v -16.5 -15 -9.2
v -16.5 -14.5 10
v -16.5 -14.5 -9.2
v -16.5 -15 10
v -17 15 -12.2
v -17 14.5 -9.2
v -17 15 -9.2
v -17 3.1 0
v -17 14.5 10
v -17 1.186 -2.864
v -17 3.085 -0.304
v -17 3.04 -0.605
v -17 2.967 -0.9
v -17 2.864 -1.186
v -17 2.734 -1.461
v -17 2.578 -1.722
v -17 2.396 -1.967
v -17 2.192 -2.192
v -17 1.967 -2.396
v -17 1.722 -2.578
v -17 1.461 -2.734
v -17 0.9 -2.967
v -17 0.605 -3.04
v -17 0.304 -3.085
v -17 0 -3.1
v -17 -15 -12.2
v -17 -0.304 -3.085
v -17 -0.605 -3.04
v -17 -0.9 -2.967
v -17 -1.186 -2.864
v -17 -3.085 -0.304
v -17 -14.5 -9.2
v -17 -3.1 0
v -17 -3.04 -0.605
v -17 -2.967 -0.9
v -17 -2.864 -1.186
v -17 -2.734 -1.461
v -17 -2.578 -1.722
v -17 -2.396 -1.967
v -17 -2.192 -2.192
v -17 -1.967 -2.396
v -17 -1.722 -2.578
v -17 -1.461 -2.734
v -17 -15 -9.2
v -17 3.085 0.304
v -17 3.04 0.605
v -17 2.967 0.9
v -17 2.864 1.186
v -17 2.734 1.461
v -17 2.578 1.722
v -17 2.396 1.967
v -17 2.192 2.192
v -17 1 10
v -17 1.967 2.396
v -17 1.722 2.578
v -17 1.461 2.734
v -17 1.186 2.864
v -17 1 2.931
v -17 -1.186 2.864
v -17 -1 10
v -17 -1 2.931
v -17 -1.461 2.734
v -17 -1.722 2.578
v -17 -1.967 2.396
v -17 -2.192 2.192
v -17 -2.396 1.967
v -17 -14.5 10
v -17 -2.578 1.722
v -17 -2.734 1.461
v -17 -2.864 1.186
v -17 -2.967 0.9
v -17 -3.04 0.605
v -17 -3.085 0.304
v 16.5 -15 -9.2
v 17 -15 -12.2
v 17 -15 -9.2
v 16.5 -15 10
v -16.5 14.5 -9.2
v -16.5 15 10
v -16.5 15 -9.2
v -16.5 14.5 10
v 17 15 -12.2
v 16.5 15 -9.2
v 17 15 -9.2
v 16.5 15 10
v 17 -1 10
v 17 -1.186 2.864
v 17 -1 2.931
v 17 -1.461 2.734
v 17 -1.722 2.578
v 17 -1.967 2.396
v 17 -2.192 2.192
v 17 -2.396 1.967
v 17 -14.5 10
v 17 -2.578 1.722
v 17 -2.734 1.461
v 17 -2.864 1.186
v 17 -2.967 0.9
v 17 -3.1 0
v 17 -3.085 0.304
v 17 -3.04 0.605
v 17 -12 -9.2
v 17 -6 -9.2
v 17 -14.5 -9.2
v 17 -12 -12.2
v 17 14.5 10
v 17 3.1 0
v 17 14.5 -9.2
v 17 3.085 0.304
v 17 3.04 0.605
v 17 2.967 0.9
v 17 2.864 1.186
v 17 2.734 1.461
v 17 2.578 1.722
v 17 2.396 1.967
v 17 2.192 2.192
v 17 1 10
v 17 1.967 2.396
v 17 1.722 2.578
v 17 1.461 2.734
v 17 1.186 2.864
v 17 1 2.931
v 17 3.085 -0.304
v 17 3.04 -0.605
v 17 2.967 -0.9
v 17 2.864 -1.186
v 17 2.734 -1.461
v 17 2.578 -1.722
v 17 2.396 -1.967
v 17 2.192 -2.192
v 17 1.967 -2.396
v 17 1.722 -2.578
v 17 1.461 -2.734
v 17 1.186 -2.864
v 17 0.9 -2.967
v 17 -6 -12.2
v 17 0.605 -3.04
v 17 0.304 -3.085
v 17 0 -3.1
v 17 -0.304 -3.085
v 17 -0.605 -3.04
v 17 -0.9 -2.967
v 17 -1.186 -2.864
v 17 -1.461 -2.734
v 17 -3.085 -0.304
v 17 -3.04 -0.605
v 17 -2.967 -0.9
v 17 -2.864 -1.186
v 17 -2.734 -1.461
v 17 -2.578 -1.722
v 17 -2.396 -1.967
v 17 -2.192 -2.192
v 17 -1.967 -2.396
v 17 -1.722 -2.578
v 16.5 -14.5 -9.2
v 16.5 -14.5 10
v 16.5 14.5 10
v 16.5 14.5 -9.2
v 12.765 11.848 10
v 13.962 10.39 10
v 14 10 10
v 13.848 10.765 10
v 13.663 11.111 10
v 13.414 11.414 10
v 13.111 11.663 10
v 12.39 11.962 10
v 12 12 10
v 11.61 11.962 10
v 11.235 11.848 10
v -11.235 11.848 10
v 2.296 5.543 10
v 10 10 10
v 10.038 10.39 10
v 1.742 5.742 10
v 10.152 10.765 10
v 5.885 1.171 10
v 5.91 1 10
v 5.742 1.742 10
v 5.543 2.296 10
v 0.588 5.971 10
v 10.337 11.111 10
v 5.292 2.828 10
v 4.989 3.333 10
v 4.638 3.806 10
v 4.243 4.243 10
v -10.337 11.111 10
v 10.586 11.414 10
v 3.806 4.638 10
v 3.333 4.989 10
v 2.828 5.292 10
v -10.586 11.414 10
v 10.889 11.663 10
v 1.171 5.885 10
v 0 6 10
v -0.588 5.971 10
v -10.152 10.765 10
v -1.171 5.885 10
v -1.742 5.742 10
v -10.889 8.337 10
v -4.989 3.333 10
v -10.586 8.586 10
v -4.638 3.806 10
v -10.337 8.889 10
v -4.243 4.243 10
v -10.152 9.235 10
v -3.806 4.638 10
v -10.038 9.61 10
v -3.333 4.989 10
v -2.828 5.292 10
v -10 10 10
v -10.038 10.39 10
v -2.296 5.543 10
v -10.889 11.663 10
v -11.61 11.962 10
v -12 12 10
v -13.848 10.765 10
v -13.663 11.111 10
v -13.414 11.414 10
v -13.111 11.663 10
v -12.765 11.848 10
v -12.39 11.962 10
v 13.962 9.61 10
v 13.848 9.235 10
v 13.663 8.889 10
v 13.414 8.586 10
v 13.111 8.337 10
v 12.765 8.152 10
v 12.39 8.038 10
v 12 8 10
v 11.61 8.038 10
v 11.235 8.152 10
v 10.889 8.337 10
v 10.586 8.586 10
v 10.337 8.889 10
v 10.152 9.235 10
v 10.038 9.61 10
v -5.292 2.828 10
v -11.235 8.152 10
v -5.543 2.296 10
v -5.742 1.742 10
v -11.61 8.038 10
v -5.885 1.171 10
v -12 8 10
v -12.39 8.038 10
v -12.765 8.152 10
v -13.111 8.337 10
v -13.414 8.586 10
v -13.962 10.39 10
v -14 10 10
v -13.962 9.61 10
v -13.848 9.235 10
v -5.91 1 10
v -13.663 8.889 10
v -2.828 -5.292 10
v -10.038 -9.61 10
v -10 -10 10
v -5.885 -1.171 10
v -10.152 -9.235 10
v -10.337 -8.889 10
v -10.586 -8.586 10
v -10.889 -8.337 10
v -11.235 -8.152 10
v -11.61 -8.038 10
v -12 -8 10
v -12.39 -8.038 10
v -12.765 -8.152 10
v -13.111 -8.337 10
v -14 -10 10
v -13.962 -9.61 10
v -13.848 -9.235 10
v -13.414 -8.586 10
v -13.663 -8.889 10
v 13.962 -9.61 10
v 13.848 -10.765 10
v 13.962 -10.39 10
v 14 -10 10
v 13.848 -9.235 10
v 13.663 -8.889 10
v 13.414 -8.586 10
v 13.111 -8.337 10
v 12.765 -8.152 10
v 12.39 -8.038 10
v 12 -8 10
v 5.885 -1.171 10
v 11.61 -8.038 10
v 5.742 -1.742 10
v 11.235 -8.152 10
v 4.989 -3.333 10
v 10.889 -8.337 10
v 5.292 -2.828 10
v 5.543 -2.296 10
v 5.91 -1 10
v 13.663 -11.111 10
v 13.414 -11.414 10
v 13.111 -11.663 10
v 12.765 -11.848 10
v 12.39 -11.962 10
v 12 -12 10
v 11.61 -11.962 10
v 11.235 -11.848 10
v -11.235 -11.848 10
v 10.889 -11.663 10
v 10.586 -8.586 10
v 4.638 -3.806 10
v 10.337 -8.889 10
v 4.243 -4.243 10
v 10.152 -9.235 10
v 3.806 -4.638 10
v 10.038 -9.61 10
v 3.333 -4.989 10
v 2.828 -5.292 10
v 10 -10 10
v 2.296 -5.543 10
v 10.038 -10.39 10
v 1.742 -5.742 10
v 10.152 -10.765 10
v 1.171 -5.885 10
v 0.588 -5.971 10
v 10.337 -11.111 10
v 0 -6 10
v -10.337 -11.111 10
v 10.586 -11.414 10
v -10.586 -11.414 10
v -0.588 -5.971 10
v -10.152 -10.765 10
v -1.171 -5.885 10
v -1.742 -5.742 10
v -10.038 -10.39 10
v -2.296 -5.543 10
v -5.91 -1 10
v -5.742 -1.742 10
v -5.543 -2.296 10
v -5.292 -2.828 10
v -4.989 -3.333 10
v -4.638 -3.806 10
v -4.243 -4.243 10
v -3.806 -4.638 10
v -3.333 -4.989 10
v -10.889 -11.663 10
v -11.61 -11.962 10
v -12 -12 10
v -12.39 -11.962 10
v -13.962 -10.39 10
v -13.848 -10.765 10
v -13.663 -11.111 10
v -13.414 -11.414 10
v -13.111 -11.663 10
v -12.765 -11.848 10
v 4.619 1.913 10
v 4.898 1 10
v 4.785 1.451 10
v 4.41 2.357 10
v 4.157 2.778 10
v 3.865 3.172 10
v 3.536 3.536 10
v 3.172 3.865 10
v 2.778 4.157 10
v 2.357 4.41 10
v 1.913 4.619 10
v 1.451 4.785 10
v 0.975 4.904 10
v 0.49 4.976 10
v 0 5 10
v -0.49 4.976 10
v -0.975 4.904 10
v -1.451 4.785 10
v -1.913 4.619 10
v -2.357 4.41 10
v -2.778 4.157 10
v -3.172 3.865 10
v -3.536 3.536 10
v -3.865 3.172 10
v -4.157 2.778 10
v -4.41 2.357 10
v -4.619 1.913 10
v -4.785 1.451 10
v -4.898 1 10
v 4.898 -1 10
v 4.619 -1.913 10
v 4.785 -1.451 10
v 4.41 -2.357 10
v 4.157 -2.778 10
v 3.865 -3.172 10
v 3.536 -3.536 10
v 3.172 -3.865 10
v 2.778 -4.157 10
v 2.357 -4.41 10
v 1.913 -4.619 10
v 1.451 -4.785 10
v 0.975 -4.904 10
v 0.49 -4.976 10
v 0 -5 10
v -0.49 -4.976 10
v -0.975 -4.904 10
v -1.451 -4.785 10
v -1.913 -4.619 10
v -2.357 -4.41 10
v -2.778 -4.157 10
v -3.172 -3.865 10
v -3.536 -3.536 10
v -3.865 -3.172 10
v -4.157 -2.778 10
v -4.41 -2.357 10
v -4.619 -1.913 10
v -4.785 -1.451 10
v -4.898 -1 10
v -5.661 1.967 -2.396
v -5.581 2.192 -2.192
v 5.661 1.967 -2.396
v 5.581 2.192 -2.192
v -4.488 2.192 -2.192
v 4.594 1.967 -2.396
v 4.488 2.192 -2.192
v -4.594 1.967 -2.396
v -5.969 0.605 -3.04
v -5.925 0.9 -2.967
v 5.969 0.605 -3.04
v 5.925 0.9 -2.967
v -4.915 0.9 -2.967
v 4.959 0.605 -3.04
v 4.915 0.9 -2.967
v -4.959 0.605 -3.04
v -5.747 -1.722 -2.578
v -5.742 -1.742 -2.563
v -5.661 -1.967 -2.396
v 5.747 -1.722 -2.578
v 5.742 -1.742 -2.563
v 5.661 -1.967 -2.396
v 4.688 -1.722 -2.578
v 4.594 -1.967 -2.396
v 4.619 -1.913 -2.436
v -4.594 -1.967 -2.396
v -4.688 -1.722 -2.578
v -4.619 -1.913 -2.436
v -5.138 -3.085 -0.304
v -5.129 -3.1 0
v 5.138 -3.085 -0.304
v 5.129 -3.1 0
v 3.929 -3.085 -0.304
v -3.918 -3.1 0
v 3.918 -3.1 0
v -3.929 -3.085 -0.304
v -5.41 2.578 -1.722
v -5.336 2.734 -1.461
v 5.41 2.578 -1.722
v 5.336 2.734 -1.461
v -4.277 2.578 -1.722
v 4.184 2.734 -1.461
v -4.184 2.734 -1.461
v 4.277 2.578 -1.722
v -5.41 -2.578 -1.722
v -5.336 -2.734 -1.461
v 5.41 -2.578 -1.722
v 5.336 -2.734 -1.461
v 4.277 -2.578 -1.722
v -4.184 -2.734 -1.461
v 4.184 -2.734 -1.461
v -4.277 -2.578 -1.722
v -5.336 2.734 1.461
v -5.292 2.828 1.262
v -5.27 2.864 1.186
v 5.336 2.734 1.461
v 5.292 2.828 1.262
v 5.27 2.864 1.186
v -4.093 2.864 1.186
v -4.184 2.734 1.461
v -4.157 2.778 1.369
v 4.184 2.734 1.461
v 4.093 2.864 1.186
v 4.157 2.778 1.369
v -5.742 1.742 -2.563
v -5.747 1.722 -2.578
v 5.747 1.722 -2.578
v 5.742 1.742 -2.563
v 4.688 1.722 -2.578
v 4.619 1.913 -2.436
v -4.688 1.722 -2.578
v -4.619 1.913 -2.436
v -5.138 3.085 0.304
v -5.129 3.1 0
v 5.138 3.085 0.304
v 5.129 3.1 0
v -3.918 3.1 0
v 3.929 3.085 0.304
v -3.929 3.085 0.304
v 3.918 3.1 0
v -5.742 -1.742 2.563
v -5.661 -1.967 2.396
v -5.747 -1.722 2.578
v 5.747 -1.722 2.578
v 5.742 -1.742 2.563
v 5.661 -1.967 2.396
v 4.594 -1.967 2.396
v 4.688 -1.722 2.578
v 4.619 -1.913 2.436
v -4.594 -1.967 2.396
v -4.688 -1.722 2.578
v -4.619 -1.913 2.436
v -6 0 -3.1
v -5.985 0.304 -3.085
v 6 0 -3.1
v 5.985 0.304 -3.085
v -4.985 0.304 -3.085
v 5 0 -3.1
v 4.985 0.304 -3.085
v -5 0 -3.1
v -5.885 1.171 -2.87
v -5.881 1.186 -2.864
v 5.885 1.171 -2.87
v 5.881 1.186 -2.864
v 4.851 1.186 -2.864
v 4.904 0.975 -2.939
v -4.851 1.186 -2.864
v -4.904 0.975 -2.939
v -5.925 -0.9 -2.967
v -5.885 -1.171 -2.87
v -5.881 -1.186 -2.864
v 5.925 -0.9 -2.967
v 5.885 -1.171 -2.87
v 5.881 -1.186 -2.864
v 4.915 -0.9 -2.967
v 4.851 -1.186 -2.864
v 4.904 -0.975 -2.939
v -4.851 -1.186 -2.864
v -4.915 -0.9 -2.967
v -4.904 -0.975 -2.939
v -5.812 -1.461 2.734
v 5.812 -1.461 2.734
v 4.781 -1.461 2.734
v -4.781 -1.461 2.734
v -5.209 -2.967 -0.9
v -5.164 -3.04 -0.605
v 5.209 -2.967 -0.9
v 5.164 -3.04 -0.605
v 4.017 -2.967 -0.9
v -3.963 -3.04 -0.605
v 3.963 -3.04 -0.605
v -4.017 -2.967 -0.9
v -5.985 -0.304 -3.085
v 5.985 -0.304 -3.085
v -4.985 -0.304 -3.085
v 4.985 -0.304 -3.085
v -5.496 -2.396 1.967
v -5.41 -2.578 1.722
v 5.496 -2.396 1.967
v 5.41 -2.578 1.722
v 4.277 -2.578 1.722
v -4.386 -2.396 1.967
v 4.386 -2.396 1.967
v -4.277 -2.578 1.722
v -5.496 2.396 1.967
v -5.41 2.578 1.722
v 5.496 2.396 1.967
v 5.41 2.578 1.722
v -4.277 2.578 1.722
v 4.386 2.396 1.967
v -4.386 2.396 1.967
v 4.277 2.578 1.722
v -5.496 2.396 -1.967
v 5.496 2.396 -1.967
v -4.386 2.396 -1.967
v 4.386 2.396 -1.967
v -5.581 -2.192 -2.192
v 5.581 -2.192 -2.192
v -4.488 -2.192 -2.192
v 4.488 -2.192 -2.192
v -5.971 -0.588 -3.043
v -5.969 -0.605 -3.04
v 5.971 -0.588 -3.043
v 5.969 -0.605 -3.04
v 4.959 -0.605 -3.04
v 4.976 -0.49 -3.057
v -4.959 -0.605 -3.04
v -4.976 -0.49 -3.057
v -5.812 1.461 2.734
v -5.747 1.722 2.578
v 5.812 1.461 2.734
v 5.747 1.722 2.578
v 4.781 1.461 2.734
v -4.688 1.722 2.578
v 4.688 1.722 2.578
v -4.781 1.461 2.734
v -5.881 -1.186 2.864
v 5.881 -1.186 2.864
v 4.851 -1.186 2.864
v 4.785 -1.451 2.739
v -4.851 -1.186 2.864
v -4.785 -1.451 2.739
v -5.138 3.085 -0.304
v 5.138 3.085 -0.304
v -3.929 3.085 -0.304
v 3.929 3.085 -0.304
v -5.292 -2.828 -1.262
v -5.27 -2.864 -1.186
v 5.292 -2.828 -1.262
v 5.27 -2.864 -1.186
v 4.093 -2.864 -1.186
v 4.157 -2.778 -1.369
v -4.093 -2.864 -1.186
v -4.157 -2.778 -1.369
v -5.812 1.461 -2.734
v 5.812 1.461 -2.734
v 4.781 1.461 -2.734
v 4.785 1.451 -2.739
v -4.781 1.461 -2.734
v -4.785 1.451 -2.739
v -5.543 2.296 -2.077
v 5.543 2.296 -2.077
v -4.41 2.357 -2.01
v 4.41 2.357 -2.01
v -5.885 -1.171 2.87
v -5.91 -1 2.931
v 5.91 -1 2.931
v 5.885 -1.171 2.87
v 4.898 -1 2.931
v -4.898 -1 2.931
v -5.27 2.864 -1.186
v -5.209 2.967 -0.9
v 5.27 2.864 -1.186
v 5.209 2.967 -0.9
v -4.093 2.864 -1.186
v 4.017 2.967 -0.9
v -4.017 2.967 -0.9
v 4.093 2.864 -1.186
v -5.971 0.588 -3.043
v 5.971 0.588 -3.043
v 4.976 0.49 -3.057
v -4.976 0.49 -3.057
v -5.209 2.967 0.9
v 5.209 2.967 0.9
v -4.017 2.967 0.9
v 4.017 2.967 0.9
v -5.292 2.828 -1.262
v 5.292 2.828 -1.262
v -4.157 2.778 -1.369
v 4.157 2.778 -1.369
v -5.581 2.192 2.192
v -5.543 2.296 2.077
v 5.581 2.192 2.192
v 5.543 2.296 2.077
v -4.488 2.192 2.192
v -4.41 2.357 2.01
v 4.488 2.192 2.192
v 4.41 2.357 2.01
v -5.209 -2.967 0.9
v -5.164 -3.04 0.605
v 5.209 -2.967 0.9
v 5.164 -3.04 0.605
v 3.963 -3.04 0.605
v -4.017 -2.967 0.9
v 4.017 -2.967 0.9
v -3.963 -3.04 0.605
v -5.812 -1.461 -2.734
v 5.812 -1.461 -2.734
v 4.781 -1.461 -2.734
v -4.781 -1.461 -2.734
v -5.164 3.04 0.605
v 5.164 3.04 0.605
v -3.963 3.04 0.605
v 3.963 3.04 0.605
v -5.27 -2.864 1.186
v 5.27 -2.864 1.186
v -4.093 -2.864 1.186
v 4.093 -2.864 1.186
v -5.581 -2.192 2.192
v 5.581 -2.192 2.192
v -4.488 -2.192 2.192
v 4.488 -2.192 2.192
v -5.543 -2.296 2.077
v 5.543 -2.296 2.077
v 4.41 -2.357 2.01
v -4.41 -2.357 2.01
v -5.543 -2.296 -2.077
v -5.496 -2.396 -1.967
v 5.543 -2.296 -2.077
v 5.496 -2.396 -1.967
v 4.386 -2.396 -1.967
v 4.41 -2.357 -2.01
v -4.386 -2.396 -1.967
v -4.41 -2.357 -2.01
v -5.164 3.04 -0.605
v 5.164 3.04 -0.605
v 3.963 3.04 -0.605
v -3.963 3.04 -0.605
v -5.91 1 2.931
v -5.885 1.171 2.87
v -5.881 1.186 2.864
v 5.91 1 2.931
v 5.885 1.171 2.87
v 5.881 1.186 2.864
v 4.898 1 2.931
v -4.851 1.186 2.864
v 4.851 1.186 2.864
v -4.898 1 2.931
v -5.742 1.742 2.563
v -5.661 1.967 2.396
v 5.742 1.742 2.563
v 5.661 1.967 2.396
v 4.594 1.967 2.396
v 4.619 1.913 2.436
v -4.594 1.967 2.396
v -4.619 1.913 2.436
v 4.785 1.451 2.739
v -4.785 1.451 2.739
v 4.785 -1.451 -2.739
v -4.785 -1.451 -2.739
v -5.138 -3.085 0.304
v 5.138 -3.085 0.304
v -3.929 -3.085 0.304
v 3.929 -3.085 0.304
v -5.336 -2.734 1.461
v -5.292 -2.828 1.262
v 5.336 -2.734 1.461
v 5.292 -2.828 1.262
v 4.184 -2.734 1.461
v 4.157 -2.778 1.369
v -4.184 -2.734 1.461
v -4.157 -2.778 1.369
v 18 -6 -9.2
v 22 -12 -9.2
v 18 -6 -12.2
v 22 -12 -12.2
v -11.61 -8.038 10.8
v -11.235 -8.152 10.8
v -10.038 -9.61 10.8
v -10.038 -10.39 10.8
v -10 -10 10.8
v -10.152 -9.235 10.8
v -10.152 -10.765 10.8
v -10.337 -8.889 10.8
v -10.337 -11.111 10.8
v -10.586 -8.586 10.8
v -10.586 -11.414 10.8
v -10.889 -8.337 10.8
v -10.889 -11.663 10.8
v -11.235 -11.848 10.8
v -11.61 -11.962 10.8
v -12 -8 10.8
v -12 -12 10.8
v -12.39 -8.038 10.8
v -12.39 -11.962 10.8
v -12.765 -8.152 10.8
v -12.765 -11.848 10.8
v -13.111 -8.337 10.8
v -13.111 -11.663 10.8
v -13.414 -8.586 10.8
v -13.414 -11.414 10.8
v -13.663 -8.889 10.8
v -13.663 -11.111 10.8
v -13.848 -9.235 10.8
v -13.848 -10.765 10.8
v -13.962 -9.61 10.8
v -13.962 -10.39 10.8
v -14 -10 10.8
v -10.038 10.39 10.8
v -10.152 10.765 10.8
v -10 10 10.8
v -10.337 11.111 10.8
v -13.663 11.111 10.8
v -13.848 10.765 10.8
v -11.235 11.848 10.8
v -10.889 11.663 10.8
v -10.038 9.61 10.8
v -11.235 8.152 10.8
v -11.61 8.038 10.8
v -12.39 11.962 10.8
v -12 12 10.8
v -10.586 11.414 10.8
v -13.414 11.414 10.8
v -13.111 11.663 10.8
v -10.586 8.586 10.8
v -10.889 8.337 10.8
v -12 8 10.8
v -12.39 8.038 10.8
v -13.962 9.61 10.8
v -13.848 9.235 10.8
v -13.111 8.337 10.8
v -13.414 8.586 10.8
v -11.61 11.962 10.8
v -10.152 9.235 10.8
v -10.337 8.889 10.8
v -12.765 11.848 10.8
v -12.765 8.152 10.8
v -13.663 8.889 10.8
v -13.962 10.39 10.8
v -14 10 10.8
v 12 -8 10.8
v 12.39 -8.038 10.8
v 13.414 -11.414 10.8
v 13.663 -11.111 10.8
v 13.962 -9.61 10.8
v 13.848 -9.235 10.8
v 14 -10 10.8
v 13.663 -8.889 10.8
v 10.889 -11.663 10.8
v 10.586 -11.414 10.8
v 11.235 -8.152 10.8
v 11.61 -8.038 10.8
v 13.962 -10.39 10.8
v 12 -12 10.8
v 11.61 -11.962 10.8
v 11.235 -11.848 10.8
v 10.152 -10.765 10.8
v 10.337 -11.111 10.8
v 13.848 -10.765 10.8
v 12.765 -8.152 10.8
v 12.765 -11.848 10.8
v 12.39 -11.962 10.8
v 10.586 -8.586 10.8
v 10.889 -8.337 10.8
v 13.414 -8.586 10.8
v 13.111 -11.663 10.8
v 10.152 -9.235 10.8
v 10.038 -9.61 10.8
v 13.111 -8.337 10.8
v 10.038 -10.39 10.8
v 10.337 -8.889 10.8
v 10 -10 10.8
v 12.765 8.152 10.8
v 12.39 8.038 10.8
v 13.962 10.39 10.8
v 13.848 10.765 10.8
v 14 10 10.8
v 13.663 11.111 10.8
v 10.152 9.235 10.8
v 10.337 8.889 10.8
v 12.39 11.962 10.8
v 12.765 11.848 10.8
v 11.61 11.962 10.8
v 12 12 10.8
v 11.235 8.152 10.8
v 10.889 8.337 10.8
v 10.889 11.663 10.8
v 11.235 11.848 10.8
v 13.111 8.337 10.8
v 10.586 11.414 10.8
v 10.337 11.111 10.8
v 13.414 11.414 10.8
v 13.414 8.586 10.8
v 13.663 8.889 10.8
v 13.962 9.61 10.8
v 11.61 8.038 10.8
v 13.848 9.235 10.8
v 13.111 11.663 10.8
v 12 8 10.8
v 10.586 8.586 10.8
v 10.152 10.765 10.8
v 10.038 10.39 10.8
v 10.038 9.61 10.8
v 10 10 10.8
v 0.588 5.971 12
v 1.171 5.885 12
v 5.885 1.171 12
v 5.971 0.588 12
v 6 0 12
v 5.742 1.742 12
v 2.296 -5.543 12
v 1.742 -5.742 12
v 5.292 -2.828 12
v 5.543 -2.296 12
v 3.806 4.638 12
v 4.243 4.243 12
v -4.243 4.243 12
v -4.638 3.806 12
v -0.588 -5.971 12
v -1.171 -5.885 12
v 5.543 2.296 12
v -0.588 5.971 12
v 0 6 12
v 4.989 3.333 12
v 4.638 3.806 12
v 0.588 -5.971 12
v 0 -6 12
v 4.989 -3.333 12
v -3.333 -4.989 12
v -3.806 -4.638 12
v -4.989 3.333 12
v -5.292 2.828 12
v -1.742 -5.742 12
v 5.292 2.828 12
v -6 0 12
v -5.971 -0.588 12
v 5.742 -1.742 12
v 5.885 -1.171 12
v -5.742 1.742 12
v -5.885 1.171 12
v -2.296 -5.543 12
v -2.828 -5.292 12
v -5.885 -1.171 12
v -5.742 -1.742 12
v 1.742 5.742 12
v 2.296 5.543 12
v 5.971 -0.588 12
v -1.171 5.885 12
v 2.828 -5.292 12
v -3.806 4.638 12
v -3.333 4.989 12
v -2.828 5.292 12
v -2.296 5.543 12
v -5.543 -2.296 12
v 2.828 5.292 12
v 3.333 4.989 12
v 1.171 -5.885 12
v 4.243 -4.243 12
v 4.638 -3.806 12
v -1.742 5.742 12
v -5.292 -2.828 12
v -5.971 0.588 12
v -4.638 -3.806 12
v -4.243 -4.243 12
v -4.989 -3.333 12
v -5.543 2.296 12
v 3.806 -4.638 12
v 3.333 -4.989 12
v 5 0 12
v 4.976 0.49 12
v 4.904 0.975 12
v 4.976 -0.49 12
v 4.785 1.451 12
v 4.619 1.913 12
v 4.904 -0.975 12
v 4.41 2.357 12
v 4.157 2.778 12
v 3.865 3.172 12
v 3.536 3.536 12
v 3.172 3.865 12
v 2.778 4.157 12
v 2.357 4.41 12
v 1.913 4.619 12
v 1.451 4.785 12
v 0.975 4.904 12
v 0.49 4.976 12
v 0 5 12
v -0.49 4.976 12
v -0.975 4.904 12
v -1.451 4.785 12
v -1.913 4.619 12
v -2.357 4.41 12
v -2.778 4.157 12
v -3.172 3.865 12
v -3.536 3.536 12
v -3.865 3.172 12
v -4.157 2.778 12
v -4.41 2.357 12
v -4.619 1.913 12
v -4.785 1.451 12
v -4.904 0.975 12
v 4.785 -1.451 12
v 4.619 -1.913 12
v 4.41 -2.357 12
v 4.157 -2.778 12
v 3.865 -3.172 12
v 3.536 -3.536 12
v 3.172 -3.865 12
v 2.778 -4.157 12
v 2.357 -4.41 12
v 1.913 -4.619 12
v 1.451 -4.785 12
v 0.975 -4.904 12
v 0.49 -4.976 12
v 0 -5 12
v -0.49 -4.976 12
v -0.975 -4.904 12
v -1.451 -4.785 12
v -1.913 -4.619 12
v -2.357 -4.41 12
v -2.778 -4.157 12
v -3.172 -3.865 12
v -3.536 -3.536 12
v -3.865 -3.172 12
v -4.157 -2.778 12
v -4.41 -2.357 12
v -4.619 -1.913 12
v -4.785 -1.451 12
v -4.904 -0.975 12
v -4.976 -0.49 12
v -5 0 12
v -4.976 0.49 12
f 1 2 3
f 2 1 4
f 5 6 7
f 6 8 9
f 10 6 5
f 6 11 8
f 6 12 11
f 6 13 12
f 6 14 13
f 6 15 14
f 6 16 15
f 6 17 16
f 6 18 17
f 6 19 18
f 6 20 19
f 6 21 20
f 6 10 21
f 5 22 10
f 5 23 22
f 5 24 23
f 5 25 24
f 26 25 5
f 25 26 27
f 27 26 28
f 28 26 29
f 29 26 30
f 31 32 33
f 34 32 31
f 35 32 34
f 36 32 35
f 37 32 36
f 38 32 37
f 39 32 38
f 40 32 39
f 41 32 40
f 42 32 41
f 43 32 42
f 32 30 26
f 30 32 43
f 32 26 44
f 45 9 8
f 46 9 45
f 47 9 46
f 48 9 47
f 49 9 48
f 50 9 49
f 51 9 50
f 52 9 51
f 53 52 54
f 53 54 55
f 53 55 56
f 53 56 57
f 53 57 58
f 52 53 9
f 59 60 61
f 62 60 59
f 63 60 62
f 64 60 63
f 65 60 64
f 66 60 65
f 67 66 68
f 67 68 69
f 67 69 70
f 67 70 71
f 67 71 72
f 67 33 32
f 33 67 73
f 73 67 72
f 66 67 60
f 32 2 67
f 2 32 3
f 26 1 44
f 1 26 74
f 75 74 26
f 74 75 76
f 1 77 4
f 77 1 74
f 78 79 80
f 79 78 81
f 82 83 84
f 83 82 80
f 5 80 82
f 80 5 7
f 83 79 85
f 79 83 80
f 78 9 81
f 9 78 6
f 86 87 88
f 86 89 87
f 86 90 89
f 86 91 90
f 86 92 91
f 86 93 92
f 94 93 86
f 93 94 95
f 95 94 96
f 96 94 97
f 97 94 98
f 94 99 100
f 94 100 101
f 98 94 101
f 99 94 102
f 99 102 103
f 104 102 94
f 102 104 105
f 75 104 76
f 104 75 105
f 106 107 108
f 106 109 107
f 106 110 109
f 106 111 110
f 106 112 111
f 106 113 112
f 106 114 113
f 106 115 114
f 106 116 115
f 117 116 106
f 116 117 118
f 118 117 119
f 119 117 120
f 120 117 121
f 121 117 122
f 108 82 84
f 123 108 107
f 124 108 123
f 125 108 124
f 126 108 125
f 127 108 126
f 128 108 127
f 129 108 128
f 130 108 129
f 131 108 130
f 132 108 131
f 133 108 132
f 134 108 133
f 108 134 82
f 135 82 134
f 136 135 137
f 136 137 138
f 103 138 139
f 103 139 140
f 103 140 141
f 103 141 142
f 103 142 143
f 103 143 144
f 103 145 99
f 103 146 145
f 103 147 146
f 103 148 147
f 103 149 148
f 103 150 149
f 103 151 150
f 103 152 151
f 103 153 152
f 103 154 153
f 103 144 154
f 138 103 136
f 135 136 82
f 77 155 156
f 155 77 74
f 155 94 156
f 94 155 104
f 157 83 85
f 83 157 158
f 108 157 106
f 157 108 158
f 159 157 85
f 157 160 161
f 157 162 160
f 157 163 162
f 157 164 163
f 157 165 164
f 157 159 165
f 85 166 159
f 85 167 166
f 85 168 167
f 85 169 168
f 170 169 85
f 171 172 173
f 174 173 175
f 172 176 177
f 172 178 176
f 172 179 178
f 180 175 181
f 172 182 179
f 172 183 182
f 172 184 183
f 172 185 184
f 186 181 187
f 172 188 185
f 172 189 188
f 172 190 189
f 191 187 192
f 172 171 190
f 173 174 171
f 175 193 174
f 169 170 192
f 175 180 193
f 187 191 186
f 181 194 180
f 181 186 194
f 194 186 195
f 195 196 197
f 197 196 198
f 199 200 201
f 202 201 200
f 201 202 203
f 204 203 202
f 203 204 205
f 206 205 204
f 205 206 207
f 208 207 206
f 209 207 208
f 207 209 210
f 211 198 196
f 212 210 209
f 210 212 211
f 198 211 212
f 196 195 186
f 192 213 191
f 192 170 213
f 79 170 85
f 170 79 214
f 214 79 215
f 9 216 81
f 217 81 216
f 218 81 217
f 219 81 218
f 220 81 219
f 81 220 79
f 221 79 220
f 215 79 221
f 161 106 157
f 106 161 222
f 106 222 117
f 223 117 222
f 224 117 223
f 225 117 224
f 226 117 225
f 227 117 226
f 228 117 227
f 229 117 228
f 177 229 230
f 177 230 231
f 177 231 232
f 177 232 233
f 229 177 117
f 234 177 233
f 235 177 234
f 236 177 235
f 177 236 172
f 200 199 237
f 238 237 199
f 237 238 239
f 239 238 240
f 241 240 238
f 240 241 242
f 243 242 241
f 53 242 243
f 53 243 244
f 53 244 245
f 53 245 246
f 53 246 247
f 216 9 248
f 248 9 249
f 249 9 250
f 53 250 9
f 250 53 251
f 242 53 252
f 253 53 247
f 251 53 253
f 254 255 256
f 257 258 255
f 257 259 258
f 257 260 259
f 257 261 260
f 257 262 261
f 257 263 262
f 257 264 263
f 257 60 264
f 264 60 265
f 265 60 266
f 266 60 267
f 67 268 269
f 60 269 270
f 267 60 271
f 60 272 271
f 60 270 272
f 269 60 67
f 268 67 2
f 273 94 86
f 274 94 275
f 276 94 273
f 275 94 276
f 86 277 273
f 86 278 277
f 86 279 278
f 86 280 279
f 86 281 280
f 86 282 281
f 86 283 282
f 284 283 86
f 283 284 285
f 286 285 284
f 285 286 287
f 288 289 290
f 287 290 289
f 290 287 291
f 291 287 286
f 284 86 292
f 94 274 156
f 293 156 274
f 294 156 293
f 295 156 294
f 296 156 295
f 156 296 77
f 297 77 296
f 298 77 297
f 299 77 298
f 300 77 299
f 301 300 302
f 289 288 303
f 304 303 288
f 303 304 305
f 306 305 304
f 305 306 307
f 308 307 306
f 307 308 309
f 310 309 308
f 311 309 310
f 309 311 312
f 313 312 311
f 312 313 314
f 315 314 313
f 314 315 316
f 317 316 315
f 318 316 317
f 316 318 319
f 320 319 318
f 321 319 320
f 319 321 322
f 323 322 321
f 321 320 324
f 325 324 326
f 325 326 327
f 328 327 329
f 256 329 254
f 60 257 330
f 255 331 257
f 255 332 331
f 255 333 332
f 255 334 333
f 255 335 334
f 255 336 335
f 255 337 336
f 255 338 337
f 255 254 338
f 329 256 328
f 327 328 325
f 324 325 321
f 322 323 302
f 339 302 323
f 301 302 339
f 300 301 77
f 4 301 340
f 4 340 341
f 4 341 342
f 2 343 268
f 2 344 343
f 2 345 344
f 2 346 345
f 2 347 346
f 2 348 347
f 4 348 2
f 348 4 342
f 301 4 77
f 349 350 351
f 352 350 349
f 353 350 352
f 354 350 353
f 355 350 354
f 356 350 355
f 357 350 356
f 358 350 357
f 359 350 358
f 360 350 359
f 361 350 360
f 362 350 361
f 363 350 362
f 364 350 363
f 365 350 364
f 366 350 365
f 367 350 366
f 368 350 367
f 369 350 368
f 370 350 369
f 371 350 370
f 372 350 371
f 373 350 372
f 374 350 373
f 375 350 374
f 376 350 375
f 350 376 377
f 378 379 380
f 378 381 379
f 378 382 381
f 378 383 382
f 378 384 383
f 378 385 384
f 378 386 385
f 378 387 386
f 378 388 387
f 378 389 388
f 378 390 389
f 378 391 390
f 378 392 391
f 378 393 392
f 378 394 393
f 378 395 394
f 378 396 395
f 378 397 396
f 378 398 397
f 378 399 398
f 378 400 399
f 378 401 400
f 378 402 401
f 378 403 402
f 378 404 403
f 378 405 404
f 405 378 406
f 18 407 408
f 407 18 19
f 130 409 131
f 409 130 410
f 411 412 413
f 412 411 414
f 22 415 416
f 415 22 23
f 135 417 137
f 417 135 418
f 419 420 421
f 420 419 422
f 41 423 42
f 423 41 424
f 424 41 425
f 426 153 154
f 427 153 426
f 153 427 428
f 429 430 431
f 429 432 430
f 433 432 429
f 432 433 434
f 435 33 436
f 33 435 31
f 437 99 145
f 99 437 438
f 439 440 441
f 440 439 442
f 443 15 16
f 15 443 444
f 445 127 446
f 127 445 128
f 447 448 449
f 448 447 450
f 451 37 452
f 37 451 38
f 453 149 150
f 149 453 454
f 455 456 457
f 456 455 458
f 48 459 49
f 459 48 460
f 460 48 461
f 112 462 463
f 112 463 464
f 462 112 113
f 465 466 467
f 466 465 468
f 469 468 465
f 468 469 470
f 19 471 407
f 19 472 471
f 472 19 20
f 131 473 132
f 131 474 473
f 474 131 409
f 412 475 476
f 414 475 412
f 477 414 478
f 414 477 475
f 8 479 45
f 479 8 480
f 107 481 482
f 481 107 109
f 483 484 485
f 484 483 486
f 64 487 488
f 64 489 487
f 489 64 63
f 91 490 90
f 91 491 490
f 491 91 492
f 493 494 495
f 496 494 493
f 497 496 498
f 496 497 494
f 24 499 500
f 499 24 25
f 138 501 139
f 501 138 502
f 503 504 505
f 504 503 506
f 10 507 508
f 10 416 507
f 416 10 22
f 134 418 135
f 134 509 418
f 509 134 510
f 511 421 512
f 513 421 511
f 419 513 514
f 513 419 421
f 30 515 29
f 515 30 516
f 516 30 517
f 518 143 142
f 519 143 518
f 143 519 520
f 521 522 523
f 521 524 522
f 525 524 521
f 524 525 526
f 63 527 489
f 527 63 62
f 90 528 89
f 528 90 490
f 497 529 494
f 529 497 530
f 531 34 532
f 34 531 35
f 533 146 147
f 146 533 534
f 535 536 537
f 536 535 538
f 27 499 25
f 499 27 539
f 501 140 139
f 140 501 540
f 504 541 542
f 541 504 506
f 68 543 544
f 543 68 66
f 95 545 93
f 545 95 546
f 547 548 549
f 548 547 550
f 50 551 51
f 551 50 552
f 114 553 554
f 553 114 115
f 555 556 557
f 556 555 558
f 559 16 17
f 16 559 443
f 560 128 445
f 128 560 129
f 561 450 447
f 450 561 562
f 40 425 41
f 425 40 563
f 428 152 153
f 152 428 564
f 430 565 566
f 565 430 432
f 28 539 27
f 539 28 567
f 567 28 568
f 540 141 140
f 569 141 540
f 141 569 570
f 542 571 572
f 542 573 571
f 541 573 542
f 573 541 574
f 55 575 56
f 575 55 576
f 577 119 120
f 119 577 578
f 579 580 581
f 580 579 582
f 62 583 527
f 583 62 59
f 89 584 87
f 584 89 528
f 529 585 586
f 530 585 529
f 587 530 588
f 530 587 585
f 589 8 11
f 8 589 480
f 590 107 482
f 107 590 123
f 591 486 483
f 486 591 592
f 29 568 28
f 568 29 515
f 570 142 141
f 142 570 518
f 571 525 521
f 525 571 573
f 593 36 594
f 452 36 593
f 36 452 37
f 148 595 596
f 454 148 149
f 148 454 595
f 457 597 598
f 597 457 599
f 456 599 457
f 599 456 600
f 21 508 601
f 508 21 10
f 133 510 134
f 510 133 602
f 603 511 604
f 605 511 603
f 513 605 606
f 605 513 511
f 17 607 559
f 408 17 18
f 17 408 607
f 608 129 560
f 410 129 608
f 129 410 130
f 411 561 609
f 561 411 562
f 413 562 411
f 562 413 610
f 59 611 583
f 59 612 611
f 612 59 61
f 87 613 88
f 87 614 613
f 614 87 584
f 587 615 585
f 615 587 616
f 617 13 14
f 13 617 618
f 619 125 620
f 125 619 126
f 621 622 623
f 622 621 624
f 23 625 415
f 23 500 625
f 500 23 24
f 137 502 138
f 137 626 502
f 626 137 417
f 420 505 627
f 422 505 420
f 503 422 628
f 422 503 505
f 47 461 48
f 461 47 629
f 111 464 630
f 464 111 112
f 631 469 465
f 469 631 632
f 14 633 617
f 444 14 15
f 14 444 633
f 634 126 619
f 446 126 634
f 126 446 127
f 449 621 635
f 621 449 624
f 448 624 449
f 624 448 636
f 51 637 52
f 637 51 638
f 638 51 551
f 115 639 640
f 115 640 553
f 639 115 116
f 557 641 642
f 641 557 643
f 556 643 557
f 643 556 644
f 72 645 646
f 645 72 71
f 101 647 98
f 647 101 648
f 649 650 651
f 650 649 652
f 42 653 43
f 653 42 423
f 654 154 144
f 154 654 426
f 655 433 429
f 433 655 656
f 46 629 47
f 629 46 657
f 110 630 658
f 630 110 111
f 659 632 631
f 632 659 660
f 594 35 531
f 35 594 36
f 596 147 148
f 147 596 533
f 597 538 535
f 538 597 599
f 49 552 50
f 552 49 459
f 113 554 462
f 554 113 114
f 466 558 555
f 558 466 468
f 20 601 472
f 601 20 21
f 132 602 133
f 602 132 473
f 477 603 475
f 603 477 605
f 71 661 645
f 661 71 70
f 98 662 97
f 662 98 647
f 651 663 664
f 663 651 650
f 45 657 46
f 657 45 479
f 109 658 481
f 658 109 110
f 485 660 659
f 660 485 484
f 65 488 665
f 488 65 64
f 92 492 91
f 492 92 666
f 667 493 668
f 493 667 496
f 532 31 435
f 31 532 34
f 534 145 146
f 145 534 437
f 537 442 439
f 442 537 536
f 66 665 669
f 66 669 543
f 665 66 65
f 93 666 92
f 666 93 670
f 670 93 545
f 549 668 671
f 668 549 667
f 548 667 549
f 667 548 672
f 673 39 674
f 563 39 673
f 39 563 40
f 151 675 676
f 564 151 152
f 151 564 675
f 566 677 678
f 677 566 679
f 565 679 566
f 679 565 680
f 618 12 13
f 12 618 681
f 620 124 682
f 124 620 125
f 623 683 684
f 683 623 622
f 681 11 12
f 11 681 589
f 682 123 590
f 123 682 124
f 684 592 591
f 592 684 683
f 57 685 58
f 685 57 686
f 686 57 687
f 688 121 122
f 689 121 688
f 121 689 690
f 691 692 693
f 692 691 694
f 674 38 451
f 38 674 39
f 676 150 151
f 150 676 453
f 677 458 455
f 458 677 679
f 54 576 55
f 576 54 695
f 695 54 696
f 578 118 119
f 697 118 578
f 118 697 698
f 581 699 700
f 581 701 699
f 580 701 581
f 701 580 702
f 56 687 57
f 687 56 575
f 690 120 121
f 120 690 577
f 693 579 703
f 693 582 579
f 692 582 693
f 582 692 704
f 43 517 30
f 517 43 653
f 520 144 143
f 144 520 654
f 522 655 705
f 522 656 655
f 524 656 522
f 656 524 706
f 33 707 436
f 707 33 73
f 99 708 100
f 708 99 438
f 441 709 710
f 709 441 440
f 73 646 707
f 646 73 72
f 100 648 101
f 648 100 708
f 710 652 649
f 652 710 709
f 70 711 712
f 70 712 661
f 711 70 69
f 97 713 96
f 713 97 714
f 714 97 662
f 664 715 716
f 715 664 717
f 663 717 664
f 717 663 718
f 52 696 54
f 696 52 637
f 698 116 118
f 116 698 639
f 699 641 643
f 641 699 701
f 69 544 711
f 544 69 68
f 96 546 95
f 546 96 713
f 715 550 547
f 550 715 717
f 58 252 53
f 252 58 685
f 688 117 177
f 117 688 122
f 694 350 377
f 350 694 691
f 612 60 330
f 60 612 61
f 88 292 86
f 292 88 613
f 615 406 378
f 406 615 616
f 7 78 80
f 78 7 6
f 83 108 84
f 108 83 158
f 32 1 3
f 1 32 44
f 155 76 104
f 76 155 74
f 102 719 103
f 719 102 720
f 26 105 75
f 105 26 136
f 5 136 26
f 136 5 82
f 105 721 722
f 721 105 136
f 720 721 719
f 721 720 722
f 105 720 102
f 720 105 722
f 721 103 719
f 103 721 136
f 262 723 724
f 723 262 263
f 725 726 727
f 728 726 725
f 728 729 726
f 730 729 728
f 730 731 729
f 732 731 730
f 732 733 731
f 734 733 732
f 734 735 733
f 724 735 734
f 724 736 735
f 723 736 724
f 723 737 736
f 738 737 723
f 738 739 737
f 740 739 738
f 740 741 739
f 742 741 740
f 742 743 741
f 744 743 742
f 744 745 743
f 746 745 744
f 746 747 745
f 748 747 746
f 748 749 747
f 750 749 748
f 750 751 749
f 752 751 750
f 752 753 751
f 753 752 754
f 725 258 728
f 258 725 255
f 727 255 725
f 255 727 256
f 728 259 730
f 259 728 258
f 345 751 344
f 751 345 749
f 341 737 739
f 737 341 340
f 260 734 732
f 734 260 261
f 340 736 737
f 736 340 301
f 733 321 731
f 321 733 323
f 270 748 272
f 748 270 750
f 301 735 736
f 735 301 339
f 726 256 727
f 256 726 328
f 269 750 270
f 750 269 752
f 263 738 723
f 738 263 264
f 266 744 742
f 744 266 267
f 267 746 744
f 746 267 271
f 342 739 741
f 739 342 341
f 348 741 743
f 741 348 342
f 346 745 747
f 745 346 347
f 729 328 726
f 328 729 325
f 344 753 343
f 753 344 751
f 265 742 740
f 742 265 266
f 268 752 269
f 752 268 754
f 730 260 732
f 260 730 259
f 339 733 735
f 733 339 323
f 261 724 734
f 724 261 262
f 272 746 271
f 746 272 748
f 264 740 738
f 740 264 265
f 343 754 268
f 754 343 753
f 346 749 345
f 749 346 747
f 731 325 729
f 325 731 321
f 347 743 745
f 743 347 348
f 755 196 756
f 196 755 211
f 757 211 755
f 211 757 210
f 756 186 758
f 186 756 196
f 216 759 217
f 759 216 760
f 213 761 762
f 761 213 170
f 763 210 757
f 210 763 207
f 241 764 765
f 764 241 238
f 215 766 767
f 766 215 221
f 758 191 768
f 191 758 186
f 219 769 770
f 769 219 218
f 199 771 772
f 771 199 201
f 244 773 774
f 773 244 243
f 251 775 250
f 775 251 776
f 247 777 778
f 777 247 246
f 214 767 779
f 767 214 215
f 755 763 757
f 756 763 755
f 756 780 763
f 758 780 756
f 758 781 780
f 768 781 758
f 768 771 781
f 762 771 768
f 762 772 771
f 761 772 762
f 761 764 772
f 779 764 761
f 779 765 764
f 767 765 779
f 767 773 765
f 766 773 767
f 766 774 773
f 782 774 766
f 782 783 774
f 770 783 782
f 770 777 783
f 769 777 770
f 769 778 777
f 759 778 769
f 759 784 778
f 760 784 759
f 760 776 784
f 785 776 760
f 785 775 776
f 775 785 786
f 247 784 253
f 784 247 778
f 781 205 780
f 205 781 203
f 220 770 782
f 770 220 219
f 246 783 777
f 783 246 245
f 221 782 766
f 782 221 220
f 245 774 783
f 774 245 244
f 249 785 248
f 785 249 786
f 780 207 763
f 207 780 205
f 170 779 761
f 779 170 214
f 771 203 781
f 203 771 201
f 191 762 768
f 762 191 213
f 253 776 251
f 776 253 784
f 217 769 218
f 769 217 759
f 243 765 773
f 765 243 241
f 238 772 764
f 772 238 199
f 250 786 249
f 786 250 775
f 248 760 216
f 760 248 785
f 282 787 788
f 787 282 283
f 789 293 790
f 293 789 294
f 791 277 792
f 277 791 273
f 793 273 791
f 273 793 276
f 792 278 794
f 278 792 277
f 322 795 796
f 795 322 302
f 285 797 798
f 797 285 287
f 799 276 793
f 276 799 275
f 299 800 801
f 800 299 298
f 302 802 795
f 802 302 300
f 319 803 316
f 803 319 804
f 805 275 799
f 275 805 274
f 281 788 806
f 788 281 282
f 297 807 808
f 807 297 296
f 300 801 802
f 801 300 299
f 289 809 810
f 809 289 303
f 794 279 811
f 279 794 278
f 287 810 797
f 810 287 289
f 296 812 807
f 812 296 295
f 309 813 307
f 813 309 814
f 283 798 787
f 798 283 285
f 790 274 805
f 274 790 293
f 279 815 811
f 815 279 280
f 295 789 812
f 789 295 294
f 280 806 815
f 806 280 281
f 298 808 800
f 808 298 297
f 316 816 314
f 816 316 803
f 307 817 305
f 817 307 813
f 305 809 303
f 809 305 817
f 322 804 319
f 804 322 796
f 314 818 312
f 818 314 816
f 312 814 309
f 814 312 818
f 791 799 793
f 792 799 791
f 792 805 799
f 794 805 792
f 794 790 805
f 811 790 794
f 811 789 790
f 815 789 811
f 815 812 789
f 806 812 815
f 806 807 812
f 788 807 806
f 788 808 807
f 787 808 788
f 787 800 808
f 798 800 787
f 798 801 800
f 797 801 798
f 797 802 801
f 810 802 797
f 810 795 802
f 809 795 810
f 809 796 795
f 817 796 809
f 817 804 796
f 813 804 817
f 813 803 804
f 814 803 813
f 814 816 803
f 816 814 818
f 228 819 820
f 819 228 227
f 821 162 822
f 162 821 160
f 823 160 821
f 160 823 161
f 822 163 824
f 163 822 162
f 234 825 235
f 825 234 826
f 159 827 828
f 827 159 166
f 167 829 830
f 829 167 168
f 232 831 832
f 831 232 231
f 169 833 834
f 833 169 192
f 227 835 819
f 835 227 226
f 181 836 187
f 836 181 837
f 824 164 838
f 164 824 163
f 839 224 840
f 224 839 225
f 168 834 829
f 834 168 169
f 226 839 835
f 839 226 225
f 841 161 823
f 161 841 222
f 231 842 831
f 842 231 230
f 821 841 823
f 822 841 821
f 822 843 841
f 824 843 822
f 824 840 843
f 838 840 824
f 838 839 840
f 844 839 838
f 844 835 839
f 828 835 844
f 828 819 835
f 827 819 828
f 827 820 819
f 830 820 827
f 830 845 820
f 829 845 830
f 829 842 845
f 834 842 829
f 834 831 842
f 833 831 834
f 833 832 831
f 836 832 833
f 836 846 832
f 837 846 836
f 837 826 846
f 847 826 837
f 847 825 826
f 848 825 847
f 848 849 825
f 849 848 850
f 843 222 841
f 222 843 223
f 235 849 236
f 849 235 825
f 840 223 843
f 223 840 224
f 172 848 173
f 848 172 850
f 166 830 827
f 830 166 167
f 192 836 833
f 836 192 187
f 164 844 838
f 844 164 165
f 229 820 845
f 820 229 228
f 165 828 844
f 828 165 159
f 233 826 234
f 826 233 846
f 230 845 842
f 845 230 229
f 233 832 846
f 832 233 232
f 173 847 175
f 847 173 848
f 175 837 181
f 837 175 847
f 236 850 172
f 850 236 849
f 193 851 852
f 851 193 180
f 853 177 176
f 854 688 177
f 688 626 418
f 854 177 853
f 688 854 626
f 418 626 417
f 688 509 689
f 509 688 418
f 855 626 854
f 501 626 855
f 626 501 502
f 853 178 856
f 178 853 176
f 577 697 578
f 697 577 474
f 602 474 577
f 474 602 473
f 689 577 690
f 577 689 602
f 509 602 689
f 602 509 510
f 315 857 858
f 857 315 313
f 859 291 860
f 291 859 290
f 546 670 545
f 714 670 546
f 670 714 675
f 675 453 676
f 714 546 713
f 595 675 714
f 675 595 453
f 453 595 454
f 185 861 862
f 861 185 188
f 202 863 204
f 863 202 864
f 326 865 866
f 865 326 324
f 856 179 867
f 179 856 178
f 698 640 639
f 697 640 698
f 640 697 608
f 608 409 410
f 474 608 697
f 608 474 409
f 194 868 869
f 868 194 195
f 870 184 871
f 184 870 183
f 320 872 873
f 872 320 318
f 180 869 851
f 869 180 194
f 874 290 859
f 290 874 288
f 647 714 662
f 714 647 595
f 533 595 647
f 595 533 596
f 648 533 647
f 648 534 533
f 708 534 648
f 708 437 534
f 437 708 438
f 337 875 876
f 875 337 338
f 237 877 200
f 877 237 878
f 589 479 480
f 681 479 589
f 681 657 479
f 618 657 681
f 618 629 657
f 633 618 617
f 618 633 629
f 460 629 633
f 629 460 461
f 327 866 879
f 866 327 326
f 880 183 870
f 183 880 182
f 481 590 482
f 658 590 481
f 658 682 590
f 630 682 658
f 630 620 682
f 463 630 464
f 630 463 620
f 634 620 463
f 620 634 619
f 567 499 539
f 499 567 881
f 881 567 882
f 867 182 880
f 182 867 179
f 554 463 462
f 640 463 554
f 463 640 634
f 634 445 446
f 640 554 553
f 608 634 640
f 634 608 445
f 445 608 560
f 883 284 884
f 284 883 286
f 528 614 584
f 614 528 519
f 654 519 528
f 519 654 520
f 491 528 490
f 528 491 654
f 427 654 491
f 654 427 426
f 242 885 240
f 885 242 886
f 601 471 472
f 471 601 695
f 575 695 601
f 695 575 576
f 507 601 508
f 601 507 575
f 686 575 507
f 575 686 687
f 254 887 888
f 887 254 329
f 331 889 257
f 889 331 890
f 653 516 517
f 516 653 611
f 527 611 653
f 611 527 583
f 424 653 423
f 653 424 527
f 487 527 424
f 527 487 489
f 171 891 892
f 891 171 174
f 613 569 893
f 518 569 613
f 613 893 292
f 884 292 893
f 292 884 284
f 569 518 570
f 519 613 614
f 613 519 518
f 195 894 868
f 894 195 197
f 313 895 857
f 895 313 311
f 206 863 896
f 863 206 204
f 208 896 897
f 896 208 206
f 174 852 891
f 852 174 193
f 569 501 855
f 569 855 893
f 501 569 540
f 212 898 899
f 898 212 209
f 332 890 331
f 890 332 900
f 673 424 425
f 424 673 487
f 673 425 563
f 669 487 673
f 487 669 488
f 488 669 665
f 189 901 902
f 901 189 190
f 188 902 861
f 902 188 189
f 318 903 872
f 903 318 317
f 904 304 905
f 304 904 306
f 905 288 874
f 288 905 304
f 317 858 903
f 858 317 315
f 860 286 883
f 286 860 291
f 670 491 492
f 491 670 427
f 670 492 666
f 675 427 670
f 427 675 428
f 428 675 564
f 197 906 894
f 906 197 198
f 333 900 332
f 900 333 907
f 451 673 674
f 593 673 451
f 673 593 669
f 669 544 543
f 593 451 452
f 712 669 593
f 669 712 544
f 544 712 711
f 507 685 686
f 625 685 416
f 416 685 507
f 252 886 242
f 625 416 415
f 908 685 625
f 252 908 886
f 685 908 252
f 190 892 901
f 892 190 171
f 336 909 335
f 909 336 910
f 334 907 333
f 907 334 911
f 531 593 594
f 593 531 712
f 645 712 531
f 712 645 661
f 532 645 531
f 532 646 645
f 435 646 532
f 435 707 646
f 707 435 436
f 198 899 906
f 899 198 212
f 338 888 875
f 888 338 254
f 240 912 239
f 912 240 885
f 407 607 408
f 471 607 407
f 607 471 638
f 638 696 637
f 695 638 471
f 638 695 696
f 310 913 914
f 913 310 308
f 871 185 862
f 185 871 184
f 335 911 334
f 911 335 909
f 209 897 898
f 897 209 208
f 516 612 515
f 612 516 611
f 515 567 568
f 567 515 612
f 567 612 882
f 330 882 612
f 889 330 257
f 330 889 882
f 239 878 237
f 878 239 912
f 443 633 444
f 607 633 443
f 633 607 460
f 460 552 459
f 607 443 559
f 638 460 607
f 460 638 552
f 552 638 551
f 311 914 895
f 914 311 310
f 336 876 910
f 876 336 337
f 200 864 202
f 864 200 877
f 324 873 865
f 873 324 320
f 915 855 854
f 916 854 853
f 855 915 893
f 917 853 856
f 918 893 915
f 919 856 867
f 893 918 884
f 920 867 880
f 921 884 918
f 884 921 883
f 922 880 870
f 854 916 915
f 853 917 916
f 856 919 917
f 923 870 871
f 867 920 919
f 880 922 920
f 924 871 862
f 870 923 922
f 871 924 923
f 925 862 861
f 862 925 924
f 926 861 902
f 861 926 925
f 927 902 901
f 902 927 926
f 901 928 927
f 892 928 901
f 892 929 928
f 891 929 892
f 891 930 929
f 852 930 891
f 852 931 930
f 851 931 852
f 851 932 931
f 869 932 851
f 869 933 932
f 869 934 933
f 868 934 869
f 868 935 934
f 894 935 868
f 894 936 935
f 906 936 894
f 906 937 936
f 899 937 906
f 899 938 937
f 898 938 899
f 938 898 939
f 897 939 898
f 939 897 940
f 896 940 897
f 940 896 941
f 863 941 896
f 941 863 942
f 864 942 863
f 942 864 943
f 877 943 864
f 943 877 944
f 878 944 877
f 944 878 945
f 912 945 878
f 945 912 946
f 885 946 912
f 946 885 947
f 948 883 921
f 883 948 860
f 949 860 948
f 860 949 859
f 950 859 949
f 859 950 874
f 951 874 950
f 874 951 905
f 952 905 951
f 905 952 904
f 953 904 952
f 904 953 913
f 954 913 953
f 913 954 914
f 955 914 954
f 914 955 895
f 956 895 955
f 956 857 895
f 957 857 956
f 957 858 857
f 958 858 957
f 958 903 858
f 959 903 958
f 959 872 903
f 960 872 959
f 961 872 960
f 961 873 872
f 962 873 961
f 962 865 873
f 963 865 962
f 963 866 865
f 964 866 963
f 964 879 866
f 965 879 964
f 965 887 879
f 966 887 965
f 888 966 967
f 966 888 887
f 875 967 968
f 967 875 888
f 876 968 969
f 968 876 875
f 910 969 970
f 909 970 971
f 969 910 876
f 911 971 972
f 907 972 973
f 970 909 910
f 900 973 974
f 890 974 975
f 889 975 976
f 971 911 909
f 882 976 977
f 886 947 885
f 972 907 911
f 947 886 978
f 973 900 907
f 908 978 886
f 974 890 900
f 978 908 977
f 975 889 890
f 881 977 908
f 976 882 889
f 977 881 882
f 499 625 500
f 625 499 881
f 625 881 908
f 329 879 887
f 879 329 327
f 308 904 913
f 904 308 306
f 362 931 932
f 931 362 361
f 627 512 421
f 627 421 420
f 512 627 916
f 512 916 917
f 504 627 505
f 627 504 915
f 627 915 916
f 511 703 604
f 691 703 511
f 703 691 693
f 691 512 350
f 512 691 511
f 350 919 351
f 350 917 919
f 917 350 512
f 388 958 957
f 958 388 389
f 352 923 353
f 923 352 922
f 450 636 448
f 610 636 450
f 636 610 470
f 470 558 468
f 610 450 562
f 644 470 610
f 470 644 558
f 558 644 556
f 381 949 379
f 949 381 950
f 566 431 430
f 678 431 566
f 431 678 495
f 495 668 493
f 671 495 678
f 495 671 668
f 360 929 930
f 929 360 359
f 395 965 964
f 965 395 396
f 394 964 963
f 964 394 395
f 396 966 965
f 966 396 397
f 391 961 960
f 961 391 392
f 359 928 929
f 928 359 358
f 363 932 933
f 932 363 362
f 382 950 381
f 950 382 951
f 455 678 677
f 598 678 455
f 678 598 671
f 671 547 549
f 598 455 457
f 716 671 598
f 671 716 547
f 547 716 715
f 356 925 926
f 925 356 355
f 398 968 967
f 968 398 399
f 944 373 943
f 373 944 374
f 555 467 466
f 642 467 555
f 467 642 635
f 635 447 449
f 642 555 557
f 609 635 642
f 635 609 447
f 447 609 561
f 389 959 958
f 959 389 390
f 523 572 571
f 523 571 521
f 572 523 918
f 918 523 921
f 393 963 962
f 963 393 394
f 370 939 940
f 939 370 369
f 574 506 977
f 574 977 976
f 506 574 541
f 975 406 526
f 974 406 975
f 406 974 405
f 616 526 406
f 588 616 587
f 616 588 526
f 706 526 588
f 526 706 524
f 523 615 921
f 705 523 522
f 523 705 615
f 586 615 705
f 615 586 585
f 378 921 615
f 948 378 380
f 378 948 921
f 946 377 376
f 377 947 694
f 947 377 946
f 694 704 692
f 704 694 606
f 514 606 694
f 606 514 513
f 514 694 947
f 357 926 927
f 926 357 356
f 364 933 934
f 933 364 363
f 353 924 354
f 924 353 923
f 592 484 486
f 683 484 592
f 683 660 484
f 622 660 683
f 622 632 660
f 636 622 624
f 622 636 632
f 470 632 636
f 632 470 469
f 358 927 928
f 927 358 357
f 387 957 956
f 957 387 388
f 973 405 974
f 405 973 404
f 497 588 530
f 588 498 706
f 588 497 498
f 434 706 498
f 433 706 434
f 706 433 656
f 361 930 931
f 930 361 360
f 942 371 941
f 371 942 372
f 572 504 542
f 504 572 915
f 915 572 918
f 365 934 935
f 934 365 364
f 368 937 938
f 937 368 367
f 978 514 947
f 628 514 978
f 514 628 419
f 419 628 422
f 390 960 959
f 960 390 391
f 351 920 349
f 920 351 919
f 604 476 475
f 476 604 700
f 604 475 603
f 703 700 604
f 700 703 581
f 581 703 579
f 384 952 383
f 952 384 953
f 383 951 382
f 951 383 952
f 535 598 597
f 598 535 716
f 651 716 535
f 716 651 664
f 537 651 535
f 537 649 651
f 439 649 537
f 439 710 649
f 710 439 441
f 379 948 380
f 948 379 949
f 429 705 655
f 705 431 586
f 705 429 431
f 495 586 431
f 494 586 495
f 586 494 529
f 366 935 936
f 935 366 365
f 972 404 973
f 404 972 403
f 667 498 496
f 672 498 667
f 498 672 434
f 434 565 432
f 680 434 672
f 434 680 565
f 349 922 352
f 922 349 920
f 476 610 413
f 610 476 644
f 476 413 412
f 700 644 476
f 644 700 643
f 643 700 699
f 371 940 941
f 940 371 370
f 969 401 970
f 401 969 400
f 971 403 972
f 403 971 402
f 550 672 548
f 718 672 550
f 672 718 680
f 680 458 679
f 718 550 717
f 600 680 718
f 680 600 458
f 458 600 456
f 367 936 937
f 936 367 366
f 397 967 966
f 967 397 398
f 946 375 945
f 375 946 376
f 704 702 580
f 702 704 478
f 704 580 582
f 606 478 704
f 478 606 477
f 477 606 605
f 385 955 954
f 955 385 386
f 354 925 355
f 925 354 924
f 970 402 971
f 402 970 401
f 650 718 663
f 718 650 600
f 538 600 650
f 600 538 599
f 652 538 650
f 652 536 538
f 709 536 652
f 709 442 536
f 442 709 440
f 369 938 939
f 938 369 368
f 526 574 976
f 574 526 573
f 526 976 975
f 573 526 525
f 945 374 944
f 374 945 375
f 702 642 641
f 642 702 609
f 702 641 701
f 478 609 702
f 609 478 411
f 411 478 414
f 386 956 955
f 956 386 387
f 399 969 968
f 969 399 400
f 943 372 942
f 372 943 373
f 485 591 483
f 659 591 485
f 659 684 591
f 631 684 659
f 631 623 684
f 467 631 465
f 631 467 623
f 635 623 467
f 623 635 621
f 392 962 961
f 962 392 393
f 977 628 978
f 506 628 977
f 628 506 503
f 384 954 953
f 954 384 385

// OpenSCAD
// Parameters
shaft_diameter_mm = 6.0; //[3.0:12.0:0.1]
block_length_mm = 34.0; //[17.0:68.0:0.5]
block_width_mm = 30.0; //[15.0:60.0:0.5]
block_height_mm = 20.0; //[10.0:40.0:0.5]
shaft_bore_clearance_mm = 0.2; //[0.0:1.0:0.05]
mount_hole_diameter_mm = 4.0; //[2.0:8.0:0.1]
mount_hole_edge_margin_mm = 5.0; //[2.5:10.0:0.5]
mount_hole_pattern_length_mm = 24.0; //[12.0:48.0:0.5]
mount_hole_pattern_width_mm = 20.0; //[10.0:40.0:0.5]
chamfer_mm = 0.5; //[0.0:2.0:0.1]
eps_mm = 0.8; //[0.2:2.0:0.1]
retention_slot_width_mm = 2.0; //[1.0:5.0:0.1]
retention_slot_depth_mm = 8.0; //[4.0:16.0:0.5]
bearing_outer_diameter_mm = 12.0; //[8.0:24.0:0.1]
bearing_length_mm = 24.0; //[12.0:40.0:0.5]
bearing_shell_thickness_mm = 1.0; //[0.5:3.0:0.1]
trapezoid_base_mm = 10.0; //[5.0:20.0:0.5]
trapezoid_top_mm = 6.0; //[3.0:15.0:0.5]
trapezoid_height_mm = 6.0; //[3.0:15.0:0.5]
assembly_plate_thickness_mm = 3.0; //[1.0:10.0:0.5]

// Linear Bearing - complete geometry
module linear_bearing() {
  color("Silver") {
    difference() {
      // Outer shell
      cylinder(r=bearing_outer_diameter_mm/2, h=bearing_length_mm, center=true, $fn=64);
      // Inner bore
      cylinder(r=(bearing_outer_diameter_mm/2) - bearing_shell_thickness_mm, h=bearing_length_mm + 2*eps_mm, center=true, $fn=64);
    }
  }
}

// Right Trapezoid - complete geometry
module right_trapezoid() {
  color("DimGray") {
    translate([block_length_mm/2 - trapezoid_base_mm/2, -block_width_mm/2 + trapezoid_height_mm/2, -block_height_mm/2 - assembly_plate_thickness_mm/2 + eps_mm])
    linear_extrude(height=assembly_plate_thickness_mm, center=true) {
      polygon(points=[[0, 0], [trapezoid_base_mm, 0], [trapezoid_top_mm, trapezoid_height_mm], [0, trapezoid_height_mm]]);
    }
  }
}

// Sbr Bearing Block Assembly - complete geometry
module sbr_bearing_block_assembly() {
  color("Black") {
    difference() {
      // Main block
      cube([block_length_mm, block_width_mm, block_height_mm], center=true);
      // Shaft bore
      translate([0, 0, 0])
      rotate([0, 90, 0])
      cylinder(r=(shaft_diameter_mm + shaft_bore_clearance_mm)/2, h=block_length_mm + 2*eps_mm, center=true, $fn=64);
      // Retention slot
      translate([0, 0, block_height_mm/2 - (retention_slot_depth_mm + eps_mm)/2])
      cube([block_length_mm + 2*eps_mm, retention_slot_width_mm, retention_slot_depth_mm + eps_mm], center=true);
      // Chamfers
      for (x = [-1, 1])
        for (y = [-1, 1])
          translate([x * (block_length_mm/2 - chamfer_mm/2), y * (block_width_mm/2 - chamfer_mm/2), 0])
          cube([chamfer_mm, chamfer_mm, block_height_mm + 2*eps_mm], center=true);
    }
  }
}

// Scs Bearing Block Assembly - complete geometry
module scs_bearing_block_assembly() {
  color("Black") {
    union() {
      sbr_bearing_block_assembly();
      // Assembly plate
      translate([0, 0, -block_height_mm/2 - assembly_plate_thickness_mm/2 + eps_mm])
      cube([block_length_mm, block_width_mm, assembly_plate_thickness_mm], center=true);
      // Right trapezoid
      right_trapezoid();
    }
  }
}

// Sbr Bearing Block Hole Positions - complete geometry
module sbr_bearing_block_hole_positions() {
  color("Silver") {
    union() {
      for (x = [-1, 1])
        for (y = [-1, 1])
          translate([x * mount_hole_pattern_length_mm/2, y * mount_hole_pattern_width_mm/2, 0])
          cylinder(r=mount_hole_diameter_mm/2, h=block_height_mm + 2*eps_mm, center=true, $fn=32);
    }
  }
}

// Assembly
module assembly() {
  scs_bearing_block_assembly();
  sbr_bearing_block_hole_positions();
  linear_bearing();
}

assembly();
